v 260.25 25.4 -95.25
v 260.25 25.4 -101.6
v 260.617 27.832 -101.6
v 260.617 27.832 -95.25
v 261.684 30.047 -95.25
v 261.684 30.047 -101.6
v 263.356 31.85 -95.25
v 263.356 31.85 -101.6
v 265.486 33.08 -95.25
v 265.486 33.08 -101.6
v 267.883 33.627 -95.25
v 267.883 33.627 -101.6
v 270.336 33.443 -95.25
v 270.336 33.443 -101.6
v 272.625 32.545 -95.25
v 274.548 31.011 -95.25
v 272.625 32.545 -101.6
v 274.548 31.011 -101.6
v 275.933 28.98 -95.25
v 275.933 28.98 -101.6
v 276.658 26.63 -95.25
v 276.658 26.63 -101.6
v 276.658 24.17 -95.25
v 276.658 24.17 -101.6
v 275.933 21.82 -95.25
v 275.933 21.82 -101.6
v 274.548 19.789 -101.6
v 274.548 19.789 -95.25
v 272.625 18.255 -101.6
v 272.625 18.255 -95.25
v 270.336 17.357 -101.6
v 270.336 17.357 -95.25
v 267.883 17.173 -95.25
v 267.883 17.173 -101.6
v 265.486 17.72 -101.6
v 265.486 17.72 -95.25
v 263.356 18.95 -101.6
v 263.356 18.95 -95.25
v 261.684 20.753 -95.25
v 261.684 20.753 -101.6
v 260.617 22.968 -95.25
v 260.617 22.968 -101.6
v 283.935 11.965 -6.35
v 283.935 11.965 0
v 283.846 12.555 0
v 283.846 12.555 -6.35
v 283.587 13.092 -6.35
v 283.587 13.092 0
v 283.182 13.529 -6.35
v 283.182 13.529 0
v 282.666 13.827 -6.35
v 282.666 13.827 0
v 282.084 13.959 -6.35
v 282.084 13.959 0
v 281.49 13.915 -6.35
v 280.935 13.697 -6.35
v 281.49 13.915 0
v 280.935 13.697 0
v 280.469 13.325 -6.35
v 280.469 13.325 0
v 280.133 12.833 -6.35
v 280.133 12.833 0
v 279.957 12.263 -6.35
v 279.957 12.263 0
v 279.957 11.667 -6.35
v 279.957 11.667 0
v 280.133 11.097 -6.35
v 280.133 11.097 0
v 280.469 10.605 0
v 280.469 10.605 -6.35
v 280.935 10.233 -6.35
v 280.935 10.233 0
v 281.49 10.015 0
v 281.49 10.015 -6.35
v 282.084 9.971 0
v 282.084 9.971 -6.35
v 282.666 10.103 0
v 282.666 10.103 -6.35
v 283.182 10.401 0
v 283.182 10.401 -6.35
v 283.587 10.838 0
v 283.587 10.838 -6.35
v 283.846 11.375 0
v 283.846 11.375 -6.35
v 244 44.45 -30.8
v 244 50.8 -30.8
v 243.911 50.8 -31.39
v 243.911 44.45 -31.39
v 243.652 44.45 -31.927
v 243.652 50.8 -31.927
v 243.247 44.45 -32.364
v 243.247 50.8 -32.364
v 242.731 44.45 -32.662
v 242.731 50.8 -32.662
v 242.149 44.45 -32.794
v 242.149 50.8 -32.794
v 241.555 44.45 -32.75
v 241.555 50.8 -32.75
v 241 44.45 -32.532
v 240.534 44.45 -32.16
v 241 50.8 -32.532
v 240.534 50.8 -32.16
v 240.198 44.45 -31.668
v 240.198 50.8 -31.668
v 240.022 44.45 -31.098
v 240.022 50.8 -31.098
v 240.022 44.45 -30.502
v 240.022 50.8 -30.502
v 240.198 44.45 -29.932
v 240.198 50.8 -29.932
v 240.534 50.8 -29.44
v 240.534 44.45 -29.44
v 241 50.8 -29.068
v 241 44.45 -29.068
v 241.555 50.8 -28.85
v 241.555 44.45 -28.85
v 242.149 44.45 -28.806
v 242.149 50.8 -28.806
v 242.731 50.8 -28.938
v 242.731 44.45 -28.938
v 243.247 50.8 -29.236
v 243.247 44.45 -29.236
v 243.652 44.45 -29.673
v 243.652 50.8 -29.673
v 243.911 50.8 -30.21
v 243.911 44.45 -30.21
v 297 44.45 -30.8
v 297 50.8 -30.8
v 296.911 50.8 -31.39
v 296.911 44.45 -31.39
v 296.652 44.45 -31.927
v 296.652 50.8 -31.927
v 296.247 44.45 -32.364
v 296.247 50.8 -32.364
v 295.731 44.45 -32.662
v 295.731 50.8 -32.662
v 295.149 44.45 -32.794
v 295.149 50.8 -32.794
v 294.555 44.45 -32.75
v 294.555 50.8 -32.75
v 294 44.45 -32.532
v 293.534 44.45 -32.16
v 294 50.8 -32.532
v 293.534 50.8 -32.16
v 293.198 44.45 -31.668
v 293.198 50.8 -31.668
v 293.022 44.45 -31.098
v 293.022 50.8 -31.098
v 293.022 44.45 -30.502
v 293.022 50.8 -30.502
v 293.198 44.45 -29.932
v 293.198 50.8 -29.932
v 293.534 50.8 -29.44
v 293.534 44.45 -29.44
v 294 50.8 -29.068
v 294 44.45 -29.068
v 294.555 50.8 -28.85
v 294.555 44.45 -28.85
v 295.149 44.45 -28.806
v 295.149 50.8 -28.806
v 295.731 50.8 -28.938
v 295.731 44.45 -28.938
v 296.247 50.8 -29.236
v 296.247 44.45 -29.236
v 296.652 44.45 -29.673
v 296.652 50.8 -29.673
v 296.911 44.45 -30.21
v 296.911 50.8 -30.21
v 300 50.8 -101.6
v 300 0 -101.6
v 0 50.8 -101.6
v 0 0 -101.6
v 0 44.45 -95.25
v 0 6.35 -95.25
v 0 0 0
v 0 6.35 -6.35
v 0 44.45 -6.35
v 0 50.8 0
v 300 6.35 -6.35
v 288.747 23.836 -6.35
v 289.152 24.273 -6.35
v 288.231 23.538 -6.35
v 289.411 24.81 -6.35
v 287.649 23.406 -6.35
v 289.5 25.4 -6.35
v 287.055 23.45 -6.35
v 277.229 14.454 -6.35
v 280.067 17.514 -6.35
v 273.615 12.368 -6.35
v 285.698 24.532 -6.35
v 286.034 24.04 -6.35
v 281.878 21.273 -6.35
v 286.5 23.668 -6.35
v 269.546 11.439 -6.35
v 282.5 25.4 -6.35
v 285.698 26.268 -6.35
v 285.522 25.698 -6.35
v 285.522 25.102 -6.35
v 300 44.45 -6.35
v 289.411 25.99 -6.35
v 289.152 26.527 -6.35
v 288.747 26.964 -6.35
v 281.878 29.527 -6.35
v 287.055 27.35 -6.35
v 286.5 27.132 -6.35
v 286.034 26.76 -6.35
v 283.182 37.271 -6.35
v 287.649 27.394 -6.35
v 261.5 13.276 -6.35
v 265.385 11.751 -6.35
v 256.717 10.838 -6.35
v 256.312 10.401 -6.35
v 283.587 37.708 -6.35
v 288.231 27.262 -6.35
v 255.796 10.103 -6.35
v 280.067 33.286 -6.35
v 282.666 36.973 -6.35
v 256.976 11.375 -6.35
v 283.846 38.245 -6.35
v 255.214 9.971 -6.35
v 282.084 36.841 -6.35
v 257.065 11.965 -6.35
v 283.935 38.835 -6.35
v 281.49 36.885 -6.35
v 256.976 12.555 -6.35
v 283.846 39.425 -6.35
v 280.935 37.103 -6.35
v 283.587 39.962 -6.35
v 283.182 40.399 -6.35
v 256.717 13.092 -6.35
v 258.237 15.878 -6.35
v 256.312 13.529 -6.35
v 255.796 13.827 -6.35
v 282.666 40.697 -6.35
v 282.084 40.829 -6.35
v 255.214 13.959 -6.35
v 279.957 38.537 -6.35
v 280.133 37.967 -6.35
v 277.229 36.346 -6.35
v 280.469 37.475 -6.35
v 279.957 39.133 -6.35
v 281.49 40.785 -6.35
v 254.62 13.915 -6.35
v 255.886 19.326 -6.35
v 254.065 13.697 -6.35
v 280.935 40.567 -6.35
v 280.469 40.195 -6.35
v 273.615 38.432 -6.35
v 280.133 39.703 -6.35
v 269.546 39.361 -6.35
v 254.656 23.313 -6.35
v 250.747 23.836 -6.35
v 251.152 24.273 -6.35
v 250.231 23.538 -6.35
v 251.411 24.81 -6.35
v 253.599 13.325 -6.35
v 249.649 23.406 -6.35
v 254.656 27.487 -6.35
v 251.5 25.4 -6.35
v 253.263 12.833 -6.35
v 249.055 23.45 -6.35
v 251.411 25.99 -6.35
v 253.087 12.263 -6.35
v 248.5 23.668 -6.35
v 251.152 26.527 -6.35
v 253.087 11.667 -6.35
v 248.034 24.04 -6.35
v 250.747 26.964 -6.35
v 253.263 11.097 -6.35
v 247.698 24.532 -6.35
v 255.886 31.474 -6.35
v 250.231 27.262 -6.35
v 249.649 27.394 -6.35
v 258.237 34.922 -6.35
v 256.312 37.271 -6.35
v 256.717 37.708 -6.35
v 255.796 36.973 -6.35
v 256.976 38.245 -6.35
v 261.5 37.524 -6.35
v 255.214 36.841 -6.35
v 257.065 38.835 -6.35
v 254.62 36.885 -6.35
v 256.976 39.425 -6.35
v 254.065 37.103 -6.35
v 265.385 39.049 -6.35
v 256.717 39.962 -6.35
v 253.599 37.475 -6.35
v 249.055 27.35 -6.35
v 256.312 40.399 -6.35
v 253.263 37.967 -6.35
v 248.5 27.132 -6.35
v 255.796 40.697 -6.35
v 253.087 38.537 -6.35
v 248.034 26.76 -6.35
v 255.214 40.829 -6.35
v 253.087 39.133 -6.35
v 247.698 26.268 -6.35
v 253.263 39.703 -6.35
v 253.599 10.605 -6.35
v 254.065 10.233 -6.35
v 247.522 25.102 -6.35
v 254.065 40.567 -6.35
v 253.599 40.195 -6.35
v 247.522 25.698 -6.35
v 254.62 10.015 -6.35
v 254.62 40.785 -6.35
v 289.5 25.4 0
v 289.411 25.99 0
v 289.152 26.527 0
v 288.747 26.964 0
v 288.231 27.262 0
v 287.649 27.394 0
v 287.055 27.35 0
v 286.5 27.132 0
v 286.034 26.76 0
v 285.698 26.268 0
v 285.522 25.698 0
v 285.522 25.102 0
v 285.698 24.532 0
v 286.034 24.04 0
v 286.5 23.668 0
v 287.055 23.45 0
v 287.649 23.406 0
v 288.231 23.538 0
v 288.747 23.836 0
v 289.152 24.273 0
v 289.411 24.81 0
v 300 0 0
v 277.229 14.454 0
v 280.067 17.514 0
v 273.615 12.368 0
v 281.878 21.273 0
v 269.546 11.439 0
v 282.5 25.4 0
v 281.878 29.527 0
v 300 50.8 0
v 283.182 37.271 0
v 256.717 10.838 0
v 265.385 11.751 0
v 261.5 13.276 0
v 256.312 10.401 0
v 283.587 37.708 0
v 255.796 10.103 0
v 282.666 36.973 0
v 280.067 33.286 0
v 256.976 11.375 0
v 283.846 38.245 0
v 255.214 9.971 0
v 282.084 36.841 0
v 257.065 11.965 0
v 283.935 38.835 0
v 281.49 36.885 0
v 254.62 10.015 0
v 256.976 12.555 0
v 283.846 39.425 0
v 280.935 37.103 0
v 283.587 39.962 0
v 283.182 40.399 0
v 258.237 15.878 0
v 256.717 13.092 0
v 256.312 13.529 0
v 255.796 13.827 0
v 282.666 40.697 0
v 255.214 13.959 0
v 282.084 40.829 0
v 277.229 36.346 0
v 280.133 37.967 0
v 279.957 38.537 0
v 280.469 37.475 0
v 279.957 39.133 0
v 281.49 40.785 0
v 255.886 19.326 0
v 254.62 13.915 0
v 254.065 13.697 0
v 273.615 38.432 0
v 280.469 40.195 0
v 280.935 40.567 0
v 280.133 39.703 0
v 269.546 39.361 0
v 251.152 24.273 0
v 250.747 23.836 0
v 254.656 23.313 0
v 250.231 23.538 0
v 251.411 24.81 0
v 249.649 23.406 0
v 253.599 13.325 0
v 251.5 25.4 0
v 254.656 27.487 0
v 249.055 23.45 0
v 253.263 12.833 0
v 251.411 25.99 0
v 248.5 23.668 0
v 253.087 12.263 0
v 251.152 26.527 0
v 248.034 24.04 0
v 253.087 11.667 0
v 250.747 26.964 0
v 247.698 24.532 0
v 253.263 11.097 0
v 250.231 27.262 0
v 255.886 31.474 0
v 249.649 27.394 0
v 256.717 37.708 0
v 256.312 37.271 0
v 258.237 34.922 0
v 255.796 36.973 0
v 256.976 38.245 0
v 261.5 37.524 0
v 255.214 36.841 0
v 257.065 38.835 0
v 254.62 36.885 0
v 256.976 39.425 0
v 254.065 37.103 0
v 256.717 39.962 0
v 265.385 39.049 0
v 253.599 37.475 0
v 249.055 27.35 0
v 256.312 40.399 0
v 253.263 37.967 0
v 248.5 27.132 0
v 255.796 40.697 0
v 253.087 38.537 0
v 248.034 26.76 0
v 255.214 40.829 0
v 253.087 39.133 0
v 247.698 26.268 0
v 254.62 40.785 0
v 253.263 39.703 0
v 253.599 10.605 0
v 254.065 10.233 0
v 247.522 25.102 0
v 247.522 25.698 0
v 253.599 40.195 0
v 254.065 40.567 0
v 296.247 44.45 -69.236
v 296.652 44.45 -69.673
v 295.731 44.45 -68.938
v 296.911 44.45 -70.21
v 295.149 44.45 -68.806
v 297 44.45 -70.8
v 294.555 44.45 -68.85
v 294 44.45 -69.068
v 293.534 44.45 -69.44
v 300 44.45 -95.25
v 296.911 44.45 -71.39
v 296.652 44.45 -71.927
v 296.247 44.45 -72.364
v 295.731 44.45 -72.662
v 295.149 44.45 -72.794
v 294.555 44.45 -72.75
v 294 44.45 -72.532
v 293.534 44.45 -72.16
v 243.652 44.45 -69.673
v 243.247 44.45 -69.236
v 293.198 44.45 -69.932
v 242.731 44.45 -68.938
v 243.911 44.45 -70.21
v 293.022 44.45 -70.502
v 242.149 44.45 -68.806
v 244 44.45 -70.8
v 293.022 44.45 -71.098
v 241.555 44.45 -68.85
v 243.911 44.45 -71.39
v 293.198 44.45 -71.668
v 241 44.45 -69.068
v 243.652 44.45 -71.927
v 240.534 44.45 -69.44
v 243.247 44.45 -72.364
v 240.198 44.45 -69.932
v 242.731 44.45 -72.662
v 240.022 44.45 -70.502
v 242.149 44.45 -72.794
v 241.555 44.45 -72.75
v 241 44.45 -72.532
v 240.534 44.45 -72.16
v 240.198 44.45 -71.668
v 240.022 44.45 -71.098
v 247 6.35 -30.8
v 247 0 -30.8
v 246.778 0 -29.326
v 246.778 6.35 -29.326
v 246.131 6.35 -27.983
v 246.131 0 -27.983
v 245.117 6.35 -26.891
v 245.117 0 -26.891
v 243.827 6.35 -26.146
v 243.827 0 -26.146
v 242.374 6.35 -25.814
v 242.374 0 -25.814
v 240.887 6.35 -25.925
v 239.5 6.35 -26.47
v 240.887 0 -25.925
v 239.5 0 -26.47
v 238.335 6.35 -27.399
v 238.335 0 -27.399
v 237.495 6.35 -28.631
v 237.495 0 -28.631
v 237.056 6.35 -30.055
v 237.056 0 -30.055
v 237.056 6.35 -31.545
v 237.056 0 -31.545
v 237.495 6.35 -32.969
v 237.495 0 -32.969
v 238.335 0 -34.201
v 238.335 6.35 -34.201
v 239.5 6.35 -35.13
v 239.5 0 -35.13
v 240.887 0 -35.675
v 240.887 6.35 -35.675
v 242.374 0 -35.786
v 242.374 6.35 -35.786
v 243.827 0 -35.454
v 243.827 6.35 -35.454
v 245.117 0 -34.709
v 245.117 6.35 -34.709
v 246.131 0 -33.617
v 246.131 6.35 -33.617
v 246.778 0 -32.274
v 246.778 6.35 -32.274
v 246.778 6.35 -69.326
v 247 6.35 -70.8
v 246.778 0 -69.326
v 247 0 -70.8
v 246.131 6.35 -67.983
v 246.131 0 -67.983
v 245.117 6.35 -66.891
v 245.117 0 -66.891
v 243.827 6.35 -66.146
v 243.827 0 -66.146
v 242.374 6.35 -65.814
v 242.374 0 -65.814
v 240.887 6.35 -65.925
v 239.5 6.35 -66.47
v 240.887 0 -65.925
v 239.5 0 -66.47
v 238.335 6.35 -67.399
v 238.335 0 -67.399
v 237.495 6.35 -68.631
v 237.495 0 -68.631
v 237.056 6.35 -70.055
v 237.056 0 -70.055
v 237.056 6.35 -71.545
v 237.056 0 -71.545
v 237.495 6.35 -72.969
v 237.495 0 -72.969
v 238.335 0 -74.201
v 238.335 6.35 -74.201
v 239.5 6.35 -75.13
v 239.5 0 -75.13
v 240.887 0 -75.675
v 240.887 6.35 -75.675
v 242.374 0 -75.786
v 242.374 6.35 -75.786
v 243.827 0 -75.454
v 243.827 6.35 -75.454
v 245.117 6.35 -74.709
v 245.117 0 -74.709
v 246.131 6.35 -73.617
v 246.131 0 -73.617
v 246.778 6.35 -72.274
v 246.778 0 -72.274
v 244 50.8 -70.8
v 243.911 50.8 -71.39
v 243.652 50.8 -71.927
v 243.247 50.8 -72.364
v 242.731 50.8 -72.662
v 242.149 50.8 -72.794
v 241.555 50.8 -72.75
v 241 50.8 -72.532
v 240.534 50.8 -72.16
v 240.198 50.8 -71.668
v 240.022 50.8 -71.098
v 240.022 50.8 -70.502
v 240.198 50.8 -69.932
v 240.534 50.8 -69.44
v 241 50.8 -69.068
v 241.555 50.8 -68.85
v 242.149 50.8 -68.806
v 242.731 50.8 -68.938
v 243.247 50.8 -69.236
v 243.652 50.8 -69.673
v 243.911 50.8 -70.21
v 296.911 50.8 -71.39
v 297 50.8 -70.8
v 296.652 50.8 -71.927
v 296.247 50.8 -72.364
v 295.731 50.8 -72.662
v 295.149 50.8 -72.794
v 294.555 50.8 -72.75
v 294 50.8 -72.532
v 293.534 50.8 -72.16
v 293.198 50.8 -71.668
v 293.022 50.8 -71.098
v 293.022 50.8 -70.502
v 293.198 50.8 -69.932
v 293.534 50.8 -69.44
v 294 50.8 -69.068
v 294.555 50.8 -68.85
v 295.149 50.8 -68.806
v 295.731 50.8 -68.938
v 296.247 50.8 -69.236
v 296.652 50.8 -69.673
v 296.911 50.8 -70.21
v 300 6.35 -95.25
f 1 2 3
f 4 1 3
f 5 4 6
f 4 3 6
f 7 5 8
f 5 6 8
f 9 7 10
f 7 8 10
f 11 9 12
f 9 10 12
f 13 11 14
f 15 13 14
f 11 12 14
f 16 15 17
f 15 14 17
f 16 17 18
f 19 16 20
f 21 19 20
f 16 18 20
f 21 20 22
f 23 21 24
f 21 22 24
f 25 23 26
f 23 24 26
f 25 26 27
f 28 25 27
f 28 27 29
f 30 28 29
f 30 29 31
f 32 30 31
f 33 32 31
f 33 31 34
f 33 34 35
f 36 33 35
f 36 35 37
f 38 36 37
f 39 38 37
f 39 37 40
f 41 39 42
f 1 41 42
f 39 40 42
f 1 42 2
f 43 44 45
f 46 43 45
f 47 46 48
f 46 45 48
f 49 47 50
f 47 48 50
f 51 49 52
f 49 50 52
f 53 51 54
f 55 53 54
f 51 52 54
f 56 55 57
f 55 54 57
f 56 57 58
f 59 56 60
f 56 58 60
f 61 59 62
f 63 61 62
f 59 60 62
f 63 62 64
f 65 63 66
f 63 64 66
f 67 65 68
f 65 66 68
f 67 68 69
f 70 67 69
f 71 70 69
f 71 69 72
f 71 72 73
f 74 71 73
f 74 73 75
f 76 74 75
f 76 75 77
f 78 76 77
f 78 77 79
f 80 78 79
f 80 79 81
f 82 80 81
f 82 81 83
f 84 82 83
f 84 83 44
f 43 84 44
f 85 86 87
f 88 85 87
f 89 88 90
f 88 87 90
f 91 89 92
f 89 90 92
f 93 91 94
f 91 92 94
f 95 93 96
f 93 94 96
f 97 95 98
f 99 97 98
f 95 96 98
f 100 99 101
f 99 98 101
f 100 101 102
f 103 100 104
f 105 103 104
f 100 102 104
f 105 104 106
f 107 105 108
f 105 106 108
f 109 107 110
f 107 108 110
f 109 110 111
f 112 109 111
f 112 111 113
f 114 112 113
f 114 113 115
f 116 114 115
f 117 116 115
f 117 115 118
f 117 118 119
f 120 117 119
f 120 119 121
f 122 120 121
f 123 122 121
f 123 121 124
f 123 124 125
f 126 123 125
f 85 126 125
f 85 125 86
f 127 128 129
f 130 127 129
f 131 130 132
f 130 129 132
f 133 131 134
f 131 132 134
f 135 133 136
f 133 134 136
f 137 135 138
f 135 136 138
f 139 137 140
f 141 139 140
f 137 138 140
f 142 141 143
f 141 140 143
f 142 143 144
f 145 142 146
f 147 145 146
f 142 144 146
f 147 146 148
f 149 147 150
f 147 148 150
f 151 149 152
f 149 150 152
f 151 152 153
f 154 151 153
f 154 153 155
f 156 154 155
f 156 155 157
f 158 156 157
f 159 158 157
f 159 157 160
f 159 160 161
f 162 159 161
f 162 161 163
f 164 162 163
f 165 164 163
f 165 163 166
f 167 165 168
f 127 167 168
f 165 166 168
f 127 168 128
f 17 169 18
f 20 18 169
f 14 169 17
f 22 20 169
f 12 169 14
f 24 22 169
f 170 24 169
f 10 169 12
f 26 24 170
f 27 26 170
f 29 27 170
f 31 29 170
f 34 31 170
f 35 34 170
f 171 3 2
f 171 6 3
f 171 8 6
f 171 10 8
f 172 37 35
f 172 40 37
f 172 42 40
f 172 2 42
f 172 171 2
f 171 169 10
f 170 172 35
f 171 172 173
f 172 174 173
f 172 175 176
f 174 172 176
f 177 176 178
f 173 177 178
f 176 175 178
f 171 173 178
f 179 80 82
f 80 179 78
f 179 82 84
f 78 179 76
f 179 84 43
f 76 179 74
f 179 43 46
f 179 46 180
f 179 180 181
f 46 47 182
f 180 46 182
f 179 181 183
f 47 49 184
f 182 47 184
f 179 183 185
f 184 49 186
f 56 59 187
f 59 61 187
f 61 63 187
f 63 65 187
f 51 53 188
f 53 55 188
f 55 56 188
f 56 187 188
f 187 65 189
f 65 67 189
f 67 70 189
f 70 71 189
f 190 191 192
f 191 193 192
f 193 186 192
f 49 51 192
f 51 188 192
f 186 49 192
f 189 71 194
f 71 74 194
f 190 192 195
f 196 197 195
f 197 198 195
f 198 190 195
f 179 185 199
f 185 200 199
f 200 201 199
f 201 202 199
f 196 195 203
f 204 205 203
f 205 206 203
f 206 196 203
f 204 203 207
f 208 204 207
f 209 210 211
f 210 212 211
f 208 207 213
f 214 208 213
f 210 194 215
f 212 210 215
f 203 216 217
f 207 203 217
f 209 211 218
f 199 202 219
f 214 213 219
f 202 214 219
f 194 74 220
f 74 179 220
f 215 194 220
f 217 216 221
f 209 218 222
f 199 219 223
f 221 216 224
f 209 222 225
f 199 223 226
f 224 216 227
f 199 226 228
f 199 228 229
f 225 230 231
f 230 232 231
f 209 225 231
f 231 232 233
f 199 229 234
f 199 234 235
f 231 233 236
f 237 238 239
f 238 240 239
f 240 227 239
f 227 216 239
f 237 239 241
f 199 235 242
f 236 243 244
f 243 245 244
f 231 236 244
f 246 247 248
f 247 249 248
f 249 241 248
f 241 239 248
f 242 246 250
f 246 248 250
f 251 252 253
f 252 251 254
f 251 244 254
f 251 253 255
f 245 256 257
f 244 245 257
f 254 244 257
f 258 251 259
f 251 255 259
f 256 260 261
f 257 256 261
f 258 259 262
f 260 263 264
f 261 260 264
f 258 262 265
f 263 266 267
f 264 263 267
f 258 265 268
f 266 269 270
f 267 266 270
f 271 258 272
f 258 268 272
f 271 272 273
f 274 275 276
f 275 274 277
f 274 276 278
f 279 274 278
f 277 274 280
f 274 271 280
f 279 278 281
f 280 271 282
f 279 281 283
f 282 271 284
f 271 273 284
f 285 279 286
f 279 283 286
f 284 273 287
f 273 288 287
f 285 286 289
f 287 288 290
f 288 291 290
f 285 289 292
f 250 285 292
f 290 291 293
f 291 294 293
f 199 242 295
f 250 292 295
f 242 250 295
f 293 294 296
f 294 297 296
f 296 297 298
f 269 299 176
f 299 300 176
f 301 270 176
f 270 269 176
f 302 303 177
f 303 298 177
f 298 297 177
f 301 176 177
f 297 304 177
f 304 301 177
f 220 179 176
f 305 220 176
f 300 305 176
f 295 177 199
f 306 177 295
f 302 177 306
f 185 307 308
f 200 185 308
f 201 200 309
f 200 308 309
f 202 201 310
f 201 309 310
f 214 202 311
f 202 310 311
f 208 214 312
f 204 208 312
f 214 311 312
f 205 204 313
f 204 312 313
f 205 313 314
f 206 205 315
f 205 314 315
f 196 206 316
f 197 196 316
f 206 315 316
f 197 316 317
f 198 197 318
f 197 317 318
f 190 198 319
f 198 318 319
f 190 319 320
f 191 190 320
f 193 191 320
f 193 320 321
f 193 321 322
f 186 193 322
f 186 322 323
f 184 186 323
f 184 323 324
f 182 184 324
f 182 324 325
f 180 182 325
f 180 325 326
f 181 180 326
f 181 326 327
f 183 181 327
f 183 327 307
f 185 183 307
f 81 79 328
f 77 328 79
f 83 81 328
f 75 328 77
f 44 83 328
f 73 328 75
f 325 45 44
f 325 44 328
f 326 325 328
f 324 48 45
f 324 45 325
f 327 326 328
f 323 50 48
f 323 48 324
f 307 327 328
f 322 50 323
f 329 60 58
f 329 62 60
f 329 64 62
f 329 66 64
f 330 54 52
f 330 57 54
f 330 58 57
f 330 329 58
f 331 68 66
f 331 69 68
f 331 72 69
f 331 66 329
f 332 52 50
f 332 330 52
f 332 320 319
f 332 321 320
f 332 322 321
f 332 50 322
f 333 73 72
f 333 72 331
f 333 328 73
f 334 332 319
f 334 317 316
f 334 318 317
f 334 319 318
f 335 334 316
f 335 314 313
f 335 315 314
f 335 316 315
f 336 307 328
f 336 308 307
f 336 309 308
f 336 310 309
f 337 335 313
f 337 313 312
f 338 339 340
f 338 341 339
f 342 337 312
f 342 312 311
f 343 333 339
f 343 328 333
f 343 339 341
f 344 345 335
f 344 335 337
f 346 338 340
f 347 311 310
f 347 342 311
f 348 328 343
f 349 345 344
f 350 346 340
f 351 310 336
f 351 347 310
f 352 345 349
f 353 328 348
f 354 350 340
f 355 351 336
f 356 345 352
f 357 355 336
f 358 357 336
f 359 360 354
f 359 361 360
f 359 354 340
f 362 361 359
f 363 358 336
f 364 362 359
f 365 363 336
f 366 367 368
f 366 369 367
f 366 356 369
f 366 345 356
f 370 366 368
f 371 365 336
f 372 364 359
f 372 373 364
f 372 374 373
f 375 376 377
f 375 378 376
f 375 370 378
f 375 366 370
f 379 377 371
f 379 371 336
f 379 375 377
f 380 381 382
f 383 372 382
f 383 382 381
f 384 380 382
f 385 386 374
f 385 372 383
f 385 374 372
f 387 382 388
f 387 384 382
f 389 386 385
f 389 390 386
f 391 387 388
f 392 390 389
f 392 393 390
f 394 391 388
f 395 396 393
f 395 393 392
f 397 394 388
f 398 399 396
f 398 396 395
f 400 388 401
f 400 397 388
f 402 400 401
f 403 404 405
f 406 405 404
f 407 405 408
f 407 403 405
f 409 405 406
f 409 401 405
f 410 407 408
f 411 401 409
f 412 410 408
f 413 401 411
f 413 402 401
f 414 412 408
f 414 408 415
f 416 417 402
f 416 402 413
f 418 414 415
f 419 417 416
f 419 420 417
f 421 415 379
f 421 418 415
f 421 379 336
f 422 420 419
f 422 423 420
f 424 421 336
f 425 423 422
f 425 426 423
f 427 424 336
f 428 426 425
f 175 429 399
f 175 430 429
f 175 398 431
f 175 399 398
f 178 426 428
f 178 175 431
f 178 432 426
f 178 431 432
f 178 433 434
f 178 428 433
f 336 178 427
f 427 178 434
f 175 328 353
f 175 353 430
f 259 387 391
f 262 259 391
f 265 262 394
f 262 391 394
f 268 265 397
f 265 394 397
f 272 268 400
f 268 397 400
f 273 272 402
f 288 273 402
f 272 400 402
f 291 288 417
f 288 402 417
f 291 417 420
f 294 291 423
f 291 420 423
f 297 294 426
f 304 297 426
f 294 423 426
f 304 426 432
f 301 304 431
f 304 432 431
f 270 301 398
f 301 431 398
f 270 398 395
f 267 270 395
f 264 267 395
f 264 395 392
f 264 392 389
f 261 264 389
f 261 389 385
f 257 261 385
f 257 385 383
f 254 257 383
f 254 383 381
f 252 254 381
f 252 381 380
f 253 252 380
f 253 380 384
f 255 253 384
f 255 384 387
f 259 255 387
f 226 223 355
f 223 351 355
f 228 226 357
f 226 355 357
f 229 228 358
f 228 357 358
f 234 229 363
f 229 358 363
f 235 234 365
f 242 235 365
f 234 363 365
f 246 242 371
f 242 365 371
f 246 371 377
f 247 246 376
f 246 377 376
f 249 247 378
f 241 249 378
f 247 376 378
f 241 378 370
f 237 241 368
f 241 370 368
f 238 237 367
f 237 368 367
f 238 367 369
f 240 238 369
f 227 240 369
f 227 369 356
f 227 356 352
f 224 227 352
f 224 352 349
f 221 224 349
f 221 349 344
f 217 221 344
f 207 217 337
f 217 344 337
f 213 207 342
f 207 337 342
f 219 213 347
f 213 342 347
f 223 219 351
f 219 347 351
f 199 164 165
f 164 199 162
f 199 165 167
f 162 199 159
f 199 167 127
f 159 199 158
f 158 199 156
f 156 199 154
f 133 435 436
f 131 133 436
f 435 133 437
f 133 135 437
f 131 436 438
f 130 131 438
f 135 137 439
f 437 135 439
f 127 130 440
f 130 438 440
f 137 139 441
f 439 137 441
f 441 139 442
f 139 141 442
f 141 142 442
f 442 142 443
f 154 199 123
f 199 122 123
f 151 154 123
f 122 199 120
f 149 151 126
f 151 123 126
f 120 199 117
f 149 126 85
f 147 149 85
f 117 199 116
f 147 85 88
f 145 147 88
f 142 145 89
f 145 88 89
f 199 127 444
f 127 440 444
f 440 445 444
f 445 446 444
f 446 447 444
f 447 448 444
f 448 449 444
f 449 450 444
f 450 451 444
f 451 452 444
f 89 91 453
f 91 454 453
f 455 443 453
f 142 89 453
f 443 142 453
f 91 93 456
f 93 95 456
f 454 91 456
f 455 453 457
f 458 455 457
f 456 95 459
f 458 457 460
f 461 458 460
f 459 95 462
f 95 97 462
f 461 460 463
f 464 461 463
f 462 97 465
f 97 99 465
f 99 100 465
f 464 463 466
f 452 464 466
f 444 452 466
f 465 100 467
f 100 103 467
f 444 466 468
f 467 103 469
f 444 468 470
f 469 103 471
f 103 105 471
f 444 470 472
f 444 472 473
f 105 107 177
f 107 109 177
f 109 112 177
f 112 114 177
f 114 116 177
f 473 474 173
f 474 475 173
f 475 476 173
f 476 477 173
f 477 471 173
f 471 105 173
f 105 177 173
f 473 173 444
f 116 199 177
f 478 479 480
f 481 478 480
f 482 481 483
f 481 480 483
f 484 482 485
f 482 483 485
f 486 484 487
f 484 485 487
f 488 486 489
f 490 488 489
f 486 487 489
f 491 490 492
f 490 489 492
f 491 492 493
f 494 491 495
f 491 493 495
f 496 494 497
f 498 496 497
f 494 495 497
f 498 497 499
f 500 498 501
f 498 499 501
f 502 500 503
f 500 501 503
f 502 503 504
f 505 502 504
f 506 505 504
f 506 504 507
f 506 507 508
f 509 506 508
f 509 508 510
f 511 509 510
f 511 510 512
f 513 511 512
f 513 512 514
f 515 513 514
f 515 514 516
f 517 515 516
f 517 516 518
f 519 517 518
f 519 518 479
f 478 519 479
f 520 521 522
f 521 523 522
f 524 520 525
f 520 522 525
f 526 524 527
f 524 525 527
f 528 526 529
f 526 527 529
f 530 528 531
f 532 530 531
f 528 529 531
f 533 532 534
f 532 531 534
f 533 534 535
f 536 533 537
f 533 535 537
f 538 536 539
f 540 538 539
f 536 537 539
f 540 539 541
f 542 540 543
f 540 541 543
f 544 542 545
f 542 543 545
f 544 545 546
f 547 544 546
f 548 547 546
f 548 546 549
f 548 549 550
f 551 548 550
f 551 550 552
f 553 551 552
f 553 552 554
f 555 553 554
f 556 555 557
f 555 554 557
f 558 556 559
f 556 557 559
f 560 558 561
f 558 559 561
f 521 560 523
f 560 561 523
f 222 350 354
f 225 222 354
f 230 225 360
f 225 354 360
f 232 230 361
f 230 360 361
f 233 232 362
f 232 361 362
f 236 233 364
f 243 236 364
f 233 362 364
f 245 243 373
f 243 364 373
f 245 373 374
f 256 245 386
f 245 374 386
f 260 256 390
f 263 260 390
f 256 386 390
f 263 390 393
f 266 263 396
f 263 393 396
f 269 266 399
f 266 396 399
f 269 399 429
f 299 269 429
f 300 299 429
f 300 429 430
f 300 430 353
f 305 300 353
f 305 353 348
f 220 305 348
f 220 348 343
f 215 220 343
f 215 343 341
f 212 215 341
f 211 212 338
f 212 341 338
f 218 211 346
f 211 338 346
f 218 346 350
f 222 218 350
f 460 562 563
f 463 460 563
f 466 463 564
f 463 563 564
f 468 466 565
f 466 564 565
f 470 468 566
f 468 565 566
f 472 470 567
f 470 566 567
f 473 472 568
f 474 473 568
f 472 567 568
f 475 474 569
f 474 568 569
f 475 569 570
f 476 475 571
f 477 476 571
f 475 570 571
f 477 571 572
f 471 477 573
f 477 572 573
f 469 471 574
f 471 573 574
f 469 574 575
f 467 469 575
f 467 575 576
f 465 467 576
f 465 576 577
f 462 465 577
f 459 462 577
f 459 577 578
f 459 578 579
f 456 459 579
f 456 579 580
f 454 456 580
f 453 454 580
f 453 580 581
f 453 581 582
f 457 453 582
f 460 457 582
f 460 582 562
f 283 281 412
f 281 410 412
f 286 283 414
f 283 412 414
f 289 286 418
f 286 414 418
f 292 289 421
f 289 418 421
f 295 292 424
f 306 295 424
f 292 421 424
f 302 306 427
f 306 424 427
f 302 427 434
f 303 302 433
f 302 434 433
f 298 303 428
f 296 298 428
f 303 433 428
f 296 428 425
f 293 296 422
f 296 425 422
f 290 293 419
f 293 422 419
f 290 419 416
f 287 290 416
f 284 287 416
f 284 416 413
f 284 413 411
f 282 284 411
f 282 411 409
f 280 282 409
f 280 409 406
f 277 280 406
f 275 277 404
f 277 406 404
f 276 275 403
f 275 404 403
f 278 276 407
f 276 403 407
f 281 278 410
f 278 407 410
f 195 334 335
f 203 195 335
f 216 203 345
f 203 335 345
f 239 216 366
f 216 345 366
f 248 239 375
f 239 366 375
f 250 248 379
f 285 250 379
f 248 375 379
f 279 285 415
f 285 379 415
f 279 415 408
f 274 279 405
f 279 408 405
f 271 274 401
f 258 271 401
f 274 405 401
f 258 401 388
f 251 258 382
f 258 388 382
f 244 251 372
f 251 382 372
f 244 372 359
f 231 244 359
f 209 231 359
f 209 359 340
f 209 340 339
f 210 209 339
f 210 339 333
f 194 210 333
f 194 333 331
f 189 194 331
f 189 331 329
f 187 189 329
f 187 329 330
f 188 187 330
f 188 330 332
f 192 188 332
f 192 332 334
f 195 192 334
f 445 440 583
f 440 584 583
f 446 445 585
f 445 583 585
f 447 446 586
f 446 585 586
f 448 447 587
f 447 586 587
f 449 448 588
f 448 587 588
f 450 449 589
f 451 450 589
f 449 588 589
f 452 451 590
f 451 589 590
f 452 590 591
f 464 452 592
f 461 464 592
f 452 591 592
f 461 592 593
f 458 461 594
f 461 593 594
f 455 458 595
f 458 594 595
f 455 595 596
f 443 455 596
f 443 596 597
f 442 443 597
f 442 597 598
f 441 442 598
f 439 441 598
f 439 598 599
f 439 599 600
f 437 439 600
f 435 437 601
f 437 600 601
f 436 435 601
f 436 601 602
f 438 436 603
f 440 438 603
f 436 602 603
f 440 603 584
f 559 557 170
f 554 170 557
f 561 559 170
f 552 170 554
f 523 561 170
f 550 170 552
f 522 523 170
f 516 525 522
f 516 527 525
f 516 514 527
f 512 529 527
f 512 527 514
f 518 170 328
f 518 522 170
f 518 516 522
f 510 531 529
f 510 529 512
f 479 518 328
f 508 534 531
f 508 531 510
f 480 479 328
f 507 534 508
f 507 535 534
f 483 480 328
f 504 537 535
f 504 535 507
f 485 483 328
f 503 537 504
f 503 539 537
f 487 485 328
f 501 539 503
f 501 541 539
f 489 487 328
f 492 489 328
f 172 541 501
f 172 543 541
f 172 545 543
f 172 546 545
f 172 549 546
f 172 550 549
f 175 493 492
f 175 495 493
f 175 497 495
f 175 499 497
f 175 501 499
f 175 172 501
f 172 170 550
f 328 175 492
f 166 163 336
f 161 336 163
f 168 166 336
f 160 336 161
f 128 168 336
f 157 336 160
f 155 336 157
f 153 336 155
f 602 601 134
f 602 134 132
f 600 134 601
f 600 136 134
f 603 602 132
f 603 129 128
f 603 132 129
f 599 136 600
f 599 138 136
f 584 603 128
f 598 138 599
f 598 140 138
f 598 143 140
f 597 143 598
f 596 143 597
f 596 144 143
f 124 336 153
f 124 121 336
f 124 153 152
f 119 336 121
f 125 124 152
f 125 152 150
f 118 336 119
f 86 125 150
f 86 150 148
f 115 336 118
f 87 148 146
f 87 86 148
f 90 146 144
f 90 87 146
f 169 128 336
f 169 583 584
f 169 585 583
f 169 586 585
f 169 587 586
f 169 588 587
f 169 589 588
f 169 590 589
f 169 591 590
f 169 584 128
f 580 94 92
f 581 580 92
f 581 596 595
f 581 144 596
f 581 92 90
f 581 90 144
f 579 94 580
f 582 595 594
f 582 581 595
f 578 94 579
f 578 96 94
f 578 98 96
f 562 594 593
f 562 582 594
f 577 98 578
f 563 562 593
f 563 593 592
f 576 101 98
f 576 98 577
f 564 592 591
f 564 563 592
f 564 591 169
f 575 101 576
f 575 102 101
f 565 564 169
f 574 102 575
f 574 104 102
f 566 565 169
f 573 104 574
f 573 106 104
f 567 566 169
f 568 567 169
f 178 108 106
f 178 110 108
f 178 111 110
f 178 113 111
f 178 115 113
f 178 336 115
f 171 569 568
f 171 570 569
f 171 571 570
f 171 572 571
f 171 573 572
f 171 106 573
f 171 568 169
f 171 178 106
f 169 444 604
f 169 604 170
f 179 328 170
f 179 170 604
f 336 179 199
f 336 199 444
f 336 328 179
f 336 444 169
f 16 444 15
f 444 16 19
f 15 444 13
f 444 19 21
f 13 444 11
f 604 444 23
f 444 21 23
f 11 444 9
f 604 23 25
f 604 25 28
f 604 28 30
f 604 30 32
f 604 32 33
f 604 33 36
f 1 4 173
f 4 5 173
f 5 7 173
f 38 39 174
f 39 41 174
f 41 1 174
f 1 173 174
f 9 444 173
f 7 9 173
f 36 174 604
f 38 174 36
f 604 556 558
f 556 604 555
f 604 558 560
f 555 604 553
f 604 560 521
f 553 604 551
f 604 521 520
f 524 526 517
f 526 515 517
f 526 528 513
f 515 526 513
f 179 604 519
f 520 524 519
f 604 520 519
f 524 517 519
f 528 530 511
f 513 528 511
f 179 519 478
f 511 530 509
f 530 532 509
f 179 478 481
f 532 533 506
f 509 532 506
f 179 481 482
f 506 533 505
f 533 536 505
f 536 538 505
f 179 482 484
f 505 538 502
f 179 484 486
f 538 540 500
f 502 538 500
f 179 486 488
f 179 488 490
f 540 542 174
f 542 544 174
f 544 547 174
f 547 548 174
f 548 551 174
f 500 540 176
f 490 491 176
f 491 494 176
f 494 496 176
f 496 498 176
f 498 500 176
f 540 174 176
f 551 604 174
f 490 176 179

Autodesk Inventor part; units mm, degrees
ref_plane "YZ Plane" through (0, 0, 0) normal (1, 0, 0) x (0, 1, 0)
ref_plane "XZ Plane" through (0, 0, 0) normal (0, 1, 0) x (-1, 0, 0)
ref_plane "XY Plane" through (0, 0, 0) normal (0, 0, 1) x (1, 0, 0)
sketch "Sketch1" plane through (0, 0, 0) normal (1, 0, 0) x (0, 1, 0)
  line L0 (0, 0) -> (50.8, 0)
  line L1 (50.8, 0) -> (50.8, -101.6)
  line L2 (50.8, -101.6) -> (0, -101.6)
  line L3 (0, -101.6) -> (0, 0)
  dimension "d0" = 101.6
  dimension "d1" = 50.8
extrude "Extrusion1" add sketch "Sketch1" along normal blind 300
shell "Shell1" thickness 6.35 removed faces 2 at (0, 16.9333, -33.8667) at (300, 16.9333, -33.8667)
sketch "Sketch2" plane through (0, 50.8, 0) normal (0, 1, 0) x (1, 0, 0)
  circle A0 centre (295, 70.8) radius 2
  circle A1 centre (295, 30.8) radius 2
  circle A2 centre (242, 70.8) radius 2
  circle A3 centre (242, 30.8) radius 2
  line L0 (295, 70.8) -> (242, 70.8) construction
  line L1 (242, 70.8) -> (242, 30.8) construction
  line L2 (242, 30.8) -> (295, 30.8) construction
  line L3 (295, 30.8) -> (295, 70.8) construction
  line L4 (300, 101.6) -> (300, 0) projected
  line L5 (237, 101.6) -> (237, 0)
  line L6 (237, 0) -> (300, 0)
  line L7 (300, 101.6) -> (237, 101.6)
  point P0 (268.5, 0)
  point P1 (268.5, 30.8)
  point P2 (295, 50.8)
  point P3 (300, 50.8)
  dimension "d5" = 4
  dimension "d6" = 63
  dimension "d7" = 40
  dimension "d8" = 53
extrude "Extrusion2" cut sketch "Sketch2" against normal up to surface (6.35 mm away) contours A0 | A1 | A2 | A3
sketch "Sketch3" plane through (0, 0, 0) normal (0, 0, 1) x (1, 0, 0)
  line L0 (297, 44.45) -> (293, 44.45) construction
  line L1 (244, 44.45) -> (240, 44.45) construction
  circle A0 centre (268.5, 25.4) radius 19 construction
  line L2 (300, 50.8) -> (300, 0) construction
  line L3 (293, 44.45) -> (268.5, 25.4) construction
  line L4 (268.5, 25.4) -> (244, 44.45) construction
  circle A1 centre (255.065, 11.965) radius 2
  circle A2 centre (281.935, 11.965) radius 2
  circle A3 centre (281.935, 38.835) radius 2
  circle A4 centre (287.5, 25.4) radius 2
  circle A5 centre (255.065, 38.835) radius 2
  circle A6 centre (249.5, 25.4) radius 2
  line L5 (249.5, 25.4) -> (268.5, 25.4) construction
  line L6 (255.065, 11.965) -> (268.5, 25.4) construction
  circle A7 centre (268.5, 25.4) radius 14
  point P0 (0, 0)
  point P1 (300, 25.4)
  point P2 (300, 25.4)
  dimension "d11" = 38
  dimension "d12" = 4
  dimension "d13" = 45
  dimension "d14" = 28
extrude "Extrusion3" cut sketch "Sketch3" against normal up to surface (6.35 mm away)
sketch "Sketch4" plane through (0, 0, -101.6) normal (0, 0, -1) x (-1, 0, 0)
  circle A0 centre (-268.5, 25.4) radius 14 construction
  circle A1 centre (-268.5, 25.4) radius 8.25
  point P0 (0, 0)
  dimension "d17" = 16.5
extrude "Extrusion4" cut sketch "Sketch4" against normal up to surface (6.35 mm away)
sketch "Sketch5" plane through (0, 0, -101.6) normal (0, -1, 0) x (1, 0, 0)
  circle A0 centre (242, 30.8) radius 2 projected
  circle A1 centre (242, 70.8) radius 2 projected
  circle A2 centre (242, 30.8) radius 5
  circle A3 centre (242, 70.8) radius 5
  point P0 (0, 101.6)
  dimension "d20" = 10
extrude "Extrusion5" cut sketch "Sketch5" against normal up to surface (6.35 mm away) contours A0 | A1 | A2 | A3
properties part number "VERTICALTUBE"
